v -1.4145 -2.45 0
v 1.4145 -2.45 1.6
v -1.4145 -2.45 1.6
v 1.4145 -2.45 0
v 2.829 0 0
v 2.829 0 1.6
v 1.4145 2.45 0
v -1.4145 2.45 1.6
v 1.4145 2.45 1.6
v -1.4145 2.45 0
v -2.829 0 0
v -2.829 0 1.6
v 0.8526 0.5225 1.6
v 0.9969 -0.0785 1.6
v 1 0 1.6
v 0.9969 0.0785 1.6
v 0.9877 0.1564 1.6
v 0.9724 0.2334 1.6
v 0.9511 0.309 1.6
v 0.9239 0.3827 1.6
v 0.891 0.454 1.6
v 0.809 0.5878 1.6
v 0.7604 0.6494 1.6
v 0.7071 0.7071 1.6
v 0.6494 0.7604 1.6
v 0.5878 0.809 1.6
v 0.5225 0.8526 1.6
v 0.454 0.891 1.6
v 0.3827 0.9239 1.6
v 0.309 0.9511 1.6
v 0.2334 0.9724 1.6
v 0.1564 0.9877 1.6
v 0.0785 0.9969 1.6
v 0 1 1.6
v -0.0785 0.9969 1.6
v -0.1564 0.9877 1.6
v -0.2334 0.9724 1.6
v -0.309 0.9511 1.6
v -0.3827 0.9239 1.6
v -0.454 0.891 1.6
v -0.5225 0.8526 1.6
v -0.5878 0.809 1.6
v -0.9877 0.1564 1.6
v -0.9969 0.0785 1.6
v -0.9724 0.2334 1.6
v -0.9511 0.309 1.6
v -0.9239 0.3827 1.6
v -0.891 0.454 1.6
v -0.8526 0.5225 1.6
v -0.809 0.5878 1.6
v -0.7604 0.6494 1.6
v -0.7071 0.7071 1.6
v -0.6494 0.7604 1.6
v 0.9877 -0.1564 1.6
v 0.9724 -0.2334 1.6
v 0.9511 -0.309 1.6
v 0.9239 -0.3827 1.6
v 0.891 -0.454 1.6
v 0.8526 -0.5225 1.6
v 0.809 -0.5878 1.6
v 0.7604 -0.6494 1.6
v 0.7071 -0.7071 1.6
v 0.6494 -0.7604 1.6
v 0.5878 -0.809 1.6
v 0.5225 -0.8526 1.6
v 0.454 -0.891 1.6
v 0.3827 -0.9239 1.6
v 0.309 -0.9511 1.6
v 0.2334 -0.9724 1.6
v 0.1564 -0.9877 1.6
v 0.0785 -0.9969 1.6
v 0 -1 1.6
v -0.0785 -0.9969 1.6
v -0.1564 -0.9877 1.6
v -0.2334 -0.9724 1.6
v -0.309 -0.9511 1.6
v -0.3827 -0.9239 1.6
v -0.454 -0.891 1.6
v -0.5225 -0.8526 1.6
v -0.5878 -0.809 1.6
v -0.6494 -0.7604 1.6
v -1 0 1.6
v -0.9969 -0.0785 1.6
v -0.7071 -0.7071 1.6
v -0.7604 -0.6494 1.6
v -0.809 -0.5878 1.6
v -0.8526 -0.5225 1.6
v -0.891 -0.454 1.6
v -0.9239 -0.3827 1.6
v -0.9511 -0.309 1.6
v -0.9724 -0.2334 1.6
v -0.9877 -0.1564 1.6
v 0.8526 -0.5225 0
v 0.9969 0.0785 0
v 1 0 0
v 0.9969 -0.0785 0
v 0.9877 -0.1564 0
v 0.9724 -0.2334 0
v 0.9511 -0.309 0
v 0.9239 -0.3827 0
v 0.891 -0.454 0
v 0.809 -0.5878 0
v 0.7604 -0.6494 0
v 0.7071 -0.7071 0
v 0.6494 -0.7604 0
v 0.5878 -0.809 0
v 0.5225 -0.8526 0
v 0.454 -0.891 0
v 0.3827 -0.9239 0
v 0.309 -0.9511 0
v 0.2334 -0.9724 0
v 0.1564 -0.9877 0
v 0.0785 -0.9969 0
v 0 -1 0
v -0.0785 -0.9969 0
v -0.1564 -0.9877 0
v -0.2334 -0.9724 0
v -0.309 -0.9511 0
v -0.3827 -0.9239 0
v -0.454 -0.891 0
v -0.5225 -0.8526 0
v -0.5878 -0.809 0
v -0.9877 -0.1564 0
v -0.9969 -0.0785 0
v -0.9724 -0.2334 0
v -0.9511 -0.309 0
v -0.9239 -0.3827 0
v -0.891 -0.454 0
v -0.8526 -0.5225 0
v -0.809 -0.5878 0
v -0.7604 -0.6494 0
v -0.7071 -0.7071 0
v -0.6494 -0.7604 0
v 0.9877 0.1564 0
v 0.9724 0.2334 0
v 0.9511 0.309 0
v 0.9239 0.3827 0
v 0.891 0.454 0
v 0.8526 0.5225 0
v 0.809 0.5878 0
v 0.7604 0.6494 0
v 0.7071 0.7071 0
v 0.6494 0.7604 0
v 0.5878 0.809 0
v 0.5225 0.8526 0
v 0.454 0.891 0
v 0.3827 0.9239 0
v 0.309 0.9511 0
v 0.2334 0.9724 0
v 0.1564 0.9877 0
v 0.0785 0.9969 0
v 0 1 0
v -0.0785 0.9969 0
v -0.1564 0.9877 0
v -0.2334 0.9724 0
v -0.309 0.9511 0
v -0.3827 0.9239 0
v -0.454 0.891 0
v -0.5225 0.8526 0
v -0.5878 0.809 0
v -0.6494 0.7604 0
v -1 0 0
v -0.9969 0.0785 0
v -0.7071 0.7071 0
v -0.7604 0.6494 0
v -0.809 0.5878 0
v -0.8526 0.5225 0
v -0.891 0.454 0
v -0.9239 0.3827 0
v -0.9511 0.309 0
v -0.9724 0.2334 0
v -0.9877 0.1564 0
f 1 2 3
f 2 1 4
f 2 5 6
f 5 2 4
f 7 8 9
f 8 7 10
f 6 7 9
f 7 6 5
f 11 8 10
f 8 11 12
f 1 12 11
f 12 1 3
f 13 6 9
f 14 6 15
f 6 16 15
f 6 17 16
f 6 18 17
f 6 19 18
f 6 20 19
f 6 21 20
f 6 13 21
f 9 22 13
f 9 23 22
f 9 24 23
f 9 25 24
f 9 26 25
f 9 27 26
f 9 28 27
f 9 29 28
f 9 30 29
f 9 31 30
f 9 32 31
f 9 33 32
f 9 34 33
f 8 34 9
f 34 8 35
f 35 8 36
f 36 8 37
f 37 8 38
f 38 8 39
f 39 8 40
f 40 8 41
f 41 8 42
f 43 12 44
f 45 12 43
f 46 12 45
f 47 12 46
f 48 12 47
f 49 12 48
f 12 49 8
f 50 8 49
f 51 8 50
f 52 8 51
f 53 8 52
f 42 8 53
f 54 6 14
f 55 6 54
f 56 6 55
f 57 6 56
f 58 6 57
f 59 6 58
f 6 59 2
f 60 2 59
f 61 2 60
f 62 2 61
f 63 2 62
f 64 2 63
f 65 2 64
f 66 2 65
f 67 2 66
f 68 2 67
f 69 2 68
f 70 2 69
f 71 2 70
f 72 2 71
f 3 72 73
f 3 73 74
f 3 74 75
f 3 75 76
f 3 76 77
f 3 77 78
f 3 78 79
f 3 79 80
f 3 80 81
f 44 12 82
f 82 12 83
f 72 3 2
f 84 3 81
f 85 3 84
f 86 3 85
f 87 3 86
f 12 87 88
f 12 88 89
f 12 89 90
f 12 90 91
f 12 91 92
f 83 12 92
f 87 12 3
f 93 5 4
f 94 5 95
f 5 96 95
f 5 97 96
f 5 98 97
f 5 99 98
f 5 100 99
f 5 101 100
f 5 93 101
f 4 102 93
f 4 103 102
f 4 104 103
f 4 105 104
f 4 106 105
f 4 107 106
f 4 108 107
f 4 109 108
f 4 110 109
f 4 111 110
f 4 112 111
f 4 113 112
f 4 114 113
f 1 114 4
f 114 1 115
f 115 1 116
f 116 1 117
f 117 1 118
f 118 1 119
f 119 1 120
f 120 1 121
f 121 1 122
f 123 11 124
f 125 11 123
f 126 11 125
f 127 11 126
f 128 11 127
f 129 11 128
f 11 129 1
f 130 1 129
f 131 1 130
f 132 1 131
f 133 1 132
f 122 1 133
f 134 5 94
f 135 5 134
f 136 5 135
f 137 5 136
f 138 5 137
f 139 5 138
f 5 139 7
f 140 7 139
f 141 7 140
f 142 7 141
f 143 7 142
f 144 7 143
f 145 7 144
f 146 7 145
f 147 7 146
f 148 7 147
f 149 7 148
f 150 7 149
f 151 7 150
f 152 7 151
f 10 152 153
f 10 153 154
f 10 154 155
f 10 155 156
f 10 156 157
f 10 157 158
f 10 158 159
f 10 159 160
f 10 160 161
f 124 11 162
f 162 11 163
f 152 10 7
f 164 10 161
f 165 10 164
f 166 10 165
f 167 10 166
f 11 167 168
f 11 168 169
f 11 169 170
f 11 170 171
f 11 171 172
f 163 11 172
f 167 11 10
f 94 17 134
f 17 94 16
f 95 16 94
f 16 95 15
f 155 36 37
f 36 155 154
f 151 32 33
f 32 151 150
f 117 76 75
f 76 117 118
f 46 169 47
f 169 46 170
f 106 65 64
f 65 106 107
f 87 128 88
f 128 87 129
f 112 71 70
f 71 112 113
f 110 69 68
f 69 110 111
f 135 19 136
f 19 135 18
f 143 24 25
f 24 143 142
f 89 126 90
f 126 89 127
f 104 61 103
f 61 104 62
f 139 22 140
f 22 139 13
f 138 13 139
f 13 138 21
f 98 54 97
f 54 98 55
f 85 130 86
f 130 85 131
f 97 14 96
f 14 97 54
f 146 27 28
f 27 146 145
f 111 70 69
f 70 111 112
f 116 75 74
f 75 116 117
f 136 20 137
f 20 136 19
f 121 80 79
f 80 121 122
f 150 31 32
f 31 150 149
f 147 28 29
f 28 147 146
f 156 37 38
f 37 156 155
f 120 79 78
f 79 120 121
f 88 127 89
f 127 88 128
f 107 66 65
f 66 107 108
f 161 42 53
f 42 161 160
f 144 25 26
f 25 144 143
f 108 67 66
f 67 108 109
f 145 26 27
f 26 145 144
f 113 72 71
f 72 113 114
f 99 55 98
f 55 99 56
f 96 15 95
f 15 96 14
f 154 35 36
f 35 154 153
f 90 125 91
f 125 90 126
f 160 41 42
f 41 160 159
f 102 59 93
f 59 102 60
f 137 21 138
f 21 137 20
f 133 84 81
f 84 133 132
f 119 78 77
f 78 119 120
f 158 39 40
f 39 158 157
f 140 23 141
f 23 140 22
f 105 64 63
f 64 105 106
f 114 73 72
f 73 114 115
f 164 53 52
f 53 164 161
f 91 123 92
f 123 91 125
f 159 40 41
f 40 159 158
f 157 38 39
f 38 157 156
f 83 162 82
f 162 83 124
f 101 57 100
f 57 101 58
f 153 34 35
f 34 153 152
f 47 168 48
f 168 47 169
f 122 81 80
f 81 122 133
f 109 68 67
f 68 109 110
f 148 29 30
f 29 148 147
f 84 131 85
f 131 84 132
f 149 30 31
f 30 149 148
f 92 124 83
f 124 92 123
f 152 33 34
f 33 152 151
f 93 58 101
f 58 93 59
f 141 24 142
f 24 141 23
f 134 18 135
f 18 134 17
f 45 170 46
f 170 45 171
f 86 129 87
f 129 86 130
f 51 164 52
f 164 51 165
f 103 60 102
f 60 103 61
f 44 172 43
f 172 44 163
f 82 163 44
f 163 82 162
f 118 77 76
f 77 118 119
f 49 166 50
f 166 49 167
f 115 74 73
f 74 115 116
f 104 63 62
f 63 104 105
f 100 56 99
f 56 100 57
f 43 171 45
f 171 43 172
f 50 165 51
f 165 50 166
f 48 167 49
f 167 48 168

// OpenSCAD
$fn = 120;

across_flats = 4.9;     // mm
thickness    = 1.6;     // mm
hole_d       = 2.0;     // mm (clearance/nominal as requested)

module hex_prism_af(af, h){
    // For a regular hexagon: across flats = 2 * apothem
    // Circumradius R = apothem / cos(30°) = (af/2) / cos(30°)
    R = (af/2) / cos(30);
    cylinder(h=h, r=R, $fn=6);
}

difference(){
    hex_prism_af(across_flats, thickness);
    translate([0,0,-0.2])
        cylinder(h=thickness+0.4, d=hole_d, $fn=80);
}
